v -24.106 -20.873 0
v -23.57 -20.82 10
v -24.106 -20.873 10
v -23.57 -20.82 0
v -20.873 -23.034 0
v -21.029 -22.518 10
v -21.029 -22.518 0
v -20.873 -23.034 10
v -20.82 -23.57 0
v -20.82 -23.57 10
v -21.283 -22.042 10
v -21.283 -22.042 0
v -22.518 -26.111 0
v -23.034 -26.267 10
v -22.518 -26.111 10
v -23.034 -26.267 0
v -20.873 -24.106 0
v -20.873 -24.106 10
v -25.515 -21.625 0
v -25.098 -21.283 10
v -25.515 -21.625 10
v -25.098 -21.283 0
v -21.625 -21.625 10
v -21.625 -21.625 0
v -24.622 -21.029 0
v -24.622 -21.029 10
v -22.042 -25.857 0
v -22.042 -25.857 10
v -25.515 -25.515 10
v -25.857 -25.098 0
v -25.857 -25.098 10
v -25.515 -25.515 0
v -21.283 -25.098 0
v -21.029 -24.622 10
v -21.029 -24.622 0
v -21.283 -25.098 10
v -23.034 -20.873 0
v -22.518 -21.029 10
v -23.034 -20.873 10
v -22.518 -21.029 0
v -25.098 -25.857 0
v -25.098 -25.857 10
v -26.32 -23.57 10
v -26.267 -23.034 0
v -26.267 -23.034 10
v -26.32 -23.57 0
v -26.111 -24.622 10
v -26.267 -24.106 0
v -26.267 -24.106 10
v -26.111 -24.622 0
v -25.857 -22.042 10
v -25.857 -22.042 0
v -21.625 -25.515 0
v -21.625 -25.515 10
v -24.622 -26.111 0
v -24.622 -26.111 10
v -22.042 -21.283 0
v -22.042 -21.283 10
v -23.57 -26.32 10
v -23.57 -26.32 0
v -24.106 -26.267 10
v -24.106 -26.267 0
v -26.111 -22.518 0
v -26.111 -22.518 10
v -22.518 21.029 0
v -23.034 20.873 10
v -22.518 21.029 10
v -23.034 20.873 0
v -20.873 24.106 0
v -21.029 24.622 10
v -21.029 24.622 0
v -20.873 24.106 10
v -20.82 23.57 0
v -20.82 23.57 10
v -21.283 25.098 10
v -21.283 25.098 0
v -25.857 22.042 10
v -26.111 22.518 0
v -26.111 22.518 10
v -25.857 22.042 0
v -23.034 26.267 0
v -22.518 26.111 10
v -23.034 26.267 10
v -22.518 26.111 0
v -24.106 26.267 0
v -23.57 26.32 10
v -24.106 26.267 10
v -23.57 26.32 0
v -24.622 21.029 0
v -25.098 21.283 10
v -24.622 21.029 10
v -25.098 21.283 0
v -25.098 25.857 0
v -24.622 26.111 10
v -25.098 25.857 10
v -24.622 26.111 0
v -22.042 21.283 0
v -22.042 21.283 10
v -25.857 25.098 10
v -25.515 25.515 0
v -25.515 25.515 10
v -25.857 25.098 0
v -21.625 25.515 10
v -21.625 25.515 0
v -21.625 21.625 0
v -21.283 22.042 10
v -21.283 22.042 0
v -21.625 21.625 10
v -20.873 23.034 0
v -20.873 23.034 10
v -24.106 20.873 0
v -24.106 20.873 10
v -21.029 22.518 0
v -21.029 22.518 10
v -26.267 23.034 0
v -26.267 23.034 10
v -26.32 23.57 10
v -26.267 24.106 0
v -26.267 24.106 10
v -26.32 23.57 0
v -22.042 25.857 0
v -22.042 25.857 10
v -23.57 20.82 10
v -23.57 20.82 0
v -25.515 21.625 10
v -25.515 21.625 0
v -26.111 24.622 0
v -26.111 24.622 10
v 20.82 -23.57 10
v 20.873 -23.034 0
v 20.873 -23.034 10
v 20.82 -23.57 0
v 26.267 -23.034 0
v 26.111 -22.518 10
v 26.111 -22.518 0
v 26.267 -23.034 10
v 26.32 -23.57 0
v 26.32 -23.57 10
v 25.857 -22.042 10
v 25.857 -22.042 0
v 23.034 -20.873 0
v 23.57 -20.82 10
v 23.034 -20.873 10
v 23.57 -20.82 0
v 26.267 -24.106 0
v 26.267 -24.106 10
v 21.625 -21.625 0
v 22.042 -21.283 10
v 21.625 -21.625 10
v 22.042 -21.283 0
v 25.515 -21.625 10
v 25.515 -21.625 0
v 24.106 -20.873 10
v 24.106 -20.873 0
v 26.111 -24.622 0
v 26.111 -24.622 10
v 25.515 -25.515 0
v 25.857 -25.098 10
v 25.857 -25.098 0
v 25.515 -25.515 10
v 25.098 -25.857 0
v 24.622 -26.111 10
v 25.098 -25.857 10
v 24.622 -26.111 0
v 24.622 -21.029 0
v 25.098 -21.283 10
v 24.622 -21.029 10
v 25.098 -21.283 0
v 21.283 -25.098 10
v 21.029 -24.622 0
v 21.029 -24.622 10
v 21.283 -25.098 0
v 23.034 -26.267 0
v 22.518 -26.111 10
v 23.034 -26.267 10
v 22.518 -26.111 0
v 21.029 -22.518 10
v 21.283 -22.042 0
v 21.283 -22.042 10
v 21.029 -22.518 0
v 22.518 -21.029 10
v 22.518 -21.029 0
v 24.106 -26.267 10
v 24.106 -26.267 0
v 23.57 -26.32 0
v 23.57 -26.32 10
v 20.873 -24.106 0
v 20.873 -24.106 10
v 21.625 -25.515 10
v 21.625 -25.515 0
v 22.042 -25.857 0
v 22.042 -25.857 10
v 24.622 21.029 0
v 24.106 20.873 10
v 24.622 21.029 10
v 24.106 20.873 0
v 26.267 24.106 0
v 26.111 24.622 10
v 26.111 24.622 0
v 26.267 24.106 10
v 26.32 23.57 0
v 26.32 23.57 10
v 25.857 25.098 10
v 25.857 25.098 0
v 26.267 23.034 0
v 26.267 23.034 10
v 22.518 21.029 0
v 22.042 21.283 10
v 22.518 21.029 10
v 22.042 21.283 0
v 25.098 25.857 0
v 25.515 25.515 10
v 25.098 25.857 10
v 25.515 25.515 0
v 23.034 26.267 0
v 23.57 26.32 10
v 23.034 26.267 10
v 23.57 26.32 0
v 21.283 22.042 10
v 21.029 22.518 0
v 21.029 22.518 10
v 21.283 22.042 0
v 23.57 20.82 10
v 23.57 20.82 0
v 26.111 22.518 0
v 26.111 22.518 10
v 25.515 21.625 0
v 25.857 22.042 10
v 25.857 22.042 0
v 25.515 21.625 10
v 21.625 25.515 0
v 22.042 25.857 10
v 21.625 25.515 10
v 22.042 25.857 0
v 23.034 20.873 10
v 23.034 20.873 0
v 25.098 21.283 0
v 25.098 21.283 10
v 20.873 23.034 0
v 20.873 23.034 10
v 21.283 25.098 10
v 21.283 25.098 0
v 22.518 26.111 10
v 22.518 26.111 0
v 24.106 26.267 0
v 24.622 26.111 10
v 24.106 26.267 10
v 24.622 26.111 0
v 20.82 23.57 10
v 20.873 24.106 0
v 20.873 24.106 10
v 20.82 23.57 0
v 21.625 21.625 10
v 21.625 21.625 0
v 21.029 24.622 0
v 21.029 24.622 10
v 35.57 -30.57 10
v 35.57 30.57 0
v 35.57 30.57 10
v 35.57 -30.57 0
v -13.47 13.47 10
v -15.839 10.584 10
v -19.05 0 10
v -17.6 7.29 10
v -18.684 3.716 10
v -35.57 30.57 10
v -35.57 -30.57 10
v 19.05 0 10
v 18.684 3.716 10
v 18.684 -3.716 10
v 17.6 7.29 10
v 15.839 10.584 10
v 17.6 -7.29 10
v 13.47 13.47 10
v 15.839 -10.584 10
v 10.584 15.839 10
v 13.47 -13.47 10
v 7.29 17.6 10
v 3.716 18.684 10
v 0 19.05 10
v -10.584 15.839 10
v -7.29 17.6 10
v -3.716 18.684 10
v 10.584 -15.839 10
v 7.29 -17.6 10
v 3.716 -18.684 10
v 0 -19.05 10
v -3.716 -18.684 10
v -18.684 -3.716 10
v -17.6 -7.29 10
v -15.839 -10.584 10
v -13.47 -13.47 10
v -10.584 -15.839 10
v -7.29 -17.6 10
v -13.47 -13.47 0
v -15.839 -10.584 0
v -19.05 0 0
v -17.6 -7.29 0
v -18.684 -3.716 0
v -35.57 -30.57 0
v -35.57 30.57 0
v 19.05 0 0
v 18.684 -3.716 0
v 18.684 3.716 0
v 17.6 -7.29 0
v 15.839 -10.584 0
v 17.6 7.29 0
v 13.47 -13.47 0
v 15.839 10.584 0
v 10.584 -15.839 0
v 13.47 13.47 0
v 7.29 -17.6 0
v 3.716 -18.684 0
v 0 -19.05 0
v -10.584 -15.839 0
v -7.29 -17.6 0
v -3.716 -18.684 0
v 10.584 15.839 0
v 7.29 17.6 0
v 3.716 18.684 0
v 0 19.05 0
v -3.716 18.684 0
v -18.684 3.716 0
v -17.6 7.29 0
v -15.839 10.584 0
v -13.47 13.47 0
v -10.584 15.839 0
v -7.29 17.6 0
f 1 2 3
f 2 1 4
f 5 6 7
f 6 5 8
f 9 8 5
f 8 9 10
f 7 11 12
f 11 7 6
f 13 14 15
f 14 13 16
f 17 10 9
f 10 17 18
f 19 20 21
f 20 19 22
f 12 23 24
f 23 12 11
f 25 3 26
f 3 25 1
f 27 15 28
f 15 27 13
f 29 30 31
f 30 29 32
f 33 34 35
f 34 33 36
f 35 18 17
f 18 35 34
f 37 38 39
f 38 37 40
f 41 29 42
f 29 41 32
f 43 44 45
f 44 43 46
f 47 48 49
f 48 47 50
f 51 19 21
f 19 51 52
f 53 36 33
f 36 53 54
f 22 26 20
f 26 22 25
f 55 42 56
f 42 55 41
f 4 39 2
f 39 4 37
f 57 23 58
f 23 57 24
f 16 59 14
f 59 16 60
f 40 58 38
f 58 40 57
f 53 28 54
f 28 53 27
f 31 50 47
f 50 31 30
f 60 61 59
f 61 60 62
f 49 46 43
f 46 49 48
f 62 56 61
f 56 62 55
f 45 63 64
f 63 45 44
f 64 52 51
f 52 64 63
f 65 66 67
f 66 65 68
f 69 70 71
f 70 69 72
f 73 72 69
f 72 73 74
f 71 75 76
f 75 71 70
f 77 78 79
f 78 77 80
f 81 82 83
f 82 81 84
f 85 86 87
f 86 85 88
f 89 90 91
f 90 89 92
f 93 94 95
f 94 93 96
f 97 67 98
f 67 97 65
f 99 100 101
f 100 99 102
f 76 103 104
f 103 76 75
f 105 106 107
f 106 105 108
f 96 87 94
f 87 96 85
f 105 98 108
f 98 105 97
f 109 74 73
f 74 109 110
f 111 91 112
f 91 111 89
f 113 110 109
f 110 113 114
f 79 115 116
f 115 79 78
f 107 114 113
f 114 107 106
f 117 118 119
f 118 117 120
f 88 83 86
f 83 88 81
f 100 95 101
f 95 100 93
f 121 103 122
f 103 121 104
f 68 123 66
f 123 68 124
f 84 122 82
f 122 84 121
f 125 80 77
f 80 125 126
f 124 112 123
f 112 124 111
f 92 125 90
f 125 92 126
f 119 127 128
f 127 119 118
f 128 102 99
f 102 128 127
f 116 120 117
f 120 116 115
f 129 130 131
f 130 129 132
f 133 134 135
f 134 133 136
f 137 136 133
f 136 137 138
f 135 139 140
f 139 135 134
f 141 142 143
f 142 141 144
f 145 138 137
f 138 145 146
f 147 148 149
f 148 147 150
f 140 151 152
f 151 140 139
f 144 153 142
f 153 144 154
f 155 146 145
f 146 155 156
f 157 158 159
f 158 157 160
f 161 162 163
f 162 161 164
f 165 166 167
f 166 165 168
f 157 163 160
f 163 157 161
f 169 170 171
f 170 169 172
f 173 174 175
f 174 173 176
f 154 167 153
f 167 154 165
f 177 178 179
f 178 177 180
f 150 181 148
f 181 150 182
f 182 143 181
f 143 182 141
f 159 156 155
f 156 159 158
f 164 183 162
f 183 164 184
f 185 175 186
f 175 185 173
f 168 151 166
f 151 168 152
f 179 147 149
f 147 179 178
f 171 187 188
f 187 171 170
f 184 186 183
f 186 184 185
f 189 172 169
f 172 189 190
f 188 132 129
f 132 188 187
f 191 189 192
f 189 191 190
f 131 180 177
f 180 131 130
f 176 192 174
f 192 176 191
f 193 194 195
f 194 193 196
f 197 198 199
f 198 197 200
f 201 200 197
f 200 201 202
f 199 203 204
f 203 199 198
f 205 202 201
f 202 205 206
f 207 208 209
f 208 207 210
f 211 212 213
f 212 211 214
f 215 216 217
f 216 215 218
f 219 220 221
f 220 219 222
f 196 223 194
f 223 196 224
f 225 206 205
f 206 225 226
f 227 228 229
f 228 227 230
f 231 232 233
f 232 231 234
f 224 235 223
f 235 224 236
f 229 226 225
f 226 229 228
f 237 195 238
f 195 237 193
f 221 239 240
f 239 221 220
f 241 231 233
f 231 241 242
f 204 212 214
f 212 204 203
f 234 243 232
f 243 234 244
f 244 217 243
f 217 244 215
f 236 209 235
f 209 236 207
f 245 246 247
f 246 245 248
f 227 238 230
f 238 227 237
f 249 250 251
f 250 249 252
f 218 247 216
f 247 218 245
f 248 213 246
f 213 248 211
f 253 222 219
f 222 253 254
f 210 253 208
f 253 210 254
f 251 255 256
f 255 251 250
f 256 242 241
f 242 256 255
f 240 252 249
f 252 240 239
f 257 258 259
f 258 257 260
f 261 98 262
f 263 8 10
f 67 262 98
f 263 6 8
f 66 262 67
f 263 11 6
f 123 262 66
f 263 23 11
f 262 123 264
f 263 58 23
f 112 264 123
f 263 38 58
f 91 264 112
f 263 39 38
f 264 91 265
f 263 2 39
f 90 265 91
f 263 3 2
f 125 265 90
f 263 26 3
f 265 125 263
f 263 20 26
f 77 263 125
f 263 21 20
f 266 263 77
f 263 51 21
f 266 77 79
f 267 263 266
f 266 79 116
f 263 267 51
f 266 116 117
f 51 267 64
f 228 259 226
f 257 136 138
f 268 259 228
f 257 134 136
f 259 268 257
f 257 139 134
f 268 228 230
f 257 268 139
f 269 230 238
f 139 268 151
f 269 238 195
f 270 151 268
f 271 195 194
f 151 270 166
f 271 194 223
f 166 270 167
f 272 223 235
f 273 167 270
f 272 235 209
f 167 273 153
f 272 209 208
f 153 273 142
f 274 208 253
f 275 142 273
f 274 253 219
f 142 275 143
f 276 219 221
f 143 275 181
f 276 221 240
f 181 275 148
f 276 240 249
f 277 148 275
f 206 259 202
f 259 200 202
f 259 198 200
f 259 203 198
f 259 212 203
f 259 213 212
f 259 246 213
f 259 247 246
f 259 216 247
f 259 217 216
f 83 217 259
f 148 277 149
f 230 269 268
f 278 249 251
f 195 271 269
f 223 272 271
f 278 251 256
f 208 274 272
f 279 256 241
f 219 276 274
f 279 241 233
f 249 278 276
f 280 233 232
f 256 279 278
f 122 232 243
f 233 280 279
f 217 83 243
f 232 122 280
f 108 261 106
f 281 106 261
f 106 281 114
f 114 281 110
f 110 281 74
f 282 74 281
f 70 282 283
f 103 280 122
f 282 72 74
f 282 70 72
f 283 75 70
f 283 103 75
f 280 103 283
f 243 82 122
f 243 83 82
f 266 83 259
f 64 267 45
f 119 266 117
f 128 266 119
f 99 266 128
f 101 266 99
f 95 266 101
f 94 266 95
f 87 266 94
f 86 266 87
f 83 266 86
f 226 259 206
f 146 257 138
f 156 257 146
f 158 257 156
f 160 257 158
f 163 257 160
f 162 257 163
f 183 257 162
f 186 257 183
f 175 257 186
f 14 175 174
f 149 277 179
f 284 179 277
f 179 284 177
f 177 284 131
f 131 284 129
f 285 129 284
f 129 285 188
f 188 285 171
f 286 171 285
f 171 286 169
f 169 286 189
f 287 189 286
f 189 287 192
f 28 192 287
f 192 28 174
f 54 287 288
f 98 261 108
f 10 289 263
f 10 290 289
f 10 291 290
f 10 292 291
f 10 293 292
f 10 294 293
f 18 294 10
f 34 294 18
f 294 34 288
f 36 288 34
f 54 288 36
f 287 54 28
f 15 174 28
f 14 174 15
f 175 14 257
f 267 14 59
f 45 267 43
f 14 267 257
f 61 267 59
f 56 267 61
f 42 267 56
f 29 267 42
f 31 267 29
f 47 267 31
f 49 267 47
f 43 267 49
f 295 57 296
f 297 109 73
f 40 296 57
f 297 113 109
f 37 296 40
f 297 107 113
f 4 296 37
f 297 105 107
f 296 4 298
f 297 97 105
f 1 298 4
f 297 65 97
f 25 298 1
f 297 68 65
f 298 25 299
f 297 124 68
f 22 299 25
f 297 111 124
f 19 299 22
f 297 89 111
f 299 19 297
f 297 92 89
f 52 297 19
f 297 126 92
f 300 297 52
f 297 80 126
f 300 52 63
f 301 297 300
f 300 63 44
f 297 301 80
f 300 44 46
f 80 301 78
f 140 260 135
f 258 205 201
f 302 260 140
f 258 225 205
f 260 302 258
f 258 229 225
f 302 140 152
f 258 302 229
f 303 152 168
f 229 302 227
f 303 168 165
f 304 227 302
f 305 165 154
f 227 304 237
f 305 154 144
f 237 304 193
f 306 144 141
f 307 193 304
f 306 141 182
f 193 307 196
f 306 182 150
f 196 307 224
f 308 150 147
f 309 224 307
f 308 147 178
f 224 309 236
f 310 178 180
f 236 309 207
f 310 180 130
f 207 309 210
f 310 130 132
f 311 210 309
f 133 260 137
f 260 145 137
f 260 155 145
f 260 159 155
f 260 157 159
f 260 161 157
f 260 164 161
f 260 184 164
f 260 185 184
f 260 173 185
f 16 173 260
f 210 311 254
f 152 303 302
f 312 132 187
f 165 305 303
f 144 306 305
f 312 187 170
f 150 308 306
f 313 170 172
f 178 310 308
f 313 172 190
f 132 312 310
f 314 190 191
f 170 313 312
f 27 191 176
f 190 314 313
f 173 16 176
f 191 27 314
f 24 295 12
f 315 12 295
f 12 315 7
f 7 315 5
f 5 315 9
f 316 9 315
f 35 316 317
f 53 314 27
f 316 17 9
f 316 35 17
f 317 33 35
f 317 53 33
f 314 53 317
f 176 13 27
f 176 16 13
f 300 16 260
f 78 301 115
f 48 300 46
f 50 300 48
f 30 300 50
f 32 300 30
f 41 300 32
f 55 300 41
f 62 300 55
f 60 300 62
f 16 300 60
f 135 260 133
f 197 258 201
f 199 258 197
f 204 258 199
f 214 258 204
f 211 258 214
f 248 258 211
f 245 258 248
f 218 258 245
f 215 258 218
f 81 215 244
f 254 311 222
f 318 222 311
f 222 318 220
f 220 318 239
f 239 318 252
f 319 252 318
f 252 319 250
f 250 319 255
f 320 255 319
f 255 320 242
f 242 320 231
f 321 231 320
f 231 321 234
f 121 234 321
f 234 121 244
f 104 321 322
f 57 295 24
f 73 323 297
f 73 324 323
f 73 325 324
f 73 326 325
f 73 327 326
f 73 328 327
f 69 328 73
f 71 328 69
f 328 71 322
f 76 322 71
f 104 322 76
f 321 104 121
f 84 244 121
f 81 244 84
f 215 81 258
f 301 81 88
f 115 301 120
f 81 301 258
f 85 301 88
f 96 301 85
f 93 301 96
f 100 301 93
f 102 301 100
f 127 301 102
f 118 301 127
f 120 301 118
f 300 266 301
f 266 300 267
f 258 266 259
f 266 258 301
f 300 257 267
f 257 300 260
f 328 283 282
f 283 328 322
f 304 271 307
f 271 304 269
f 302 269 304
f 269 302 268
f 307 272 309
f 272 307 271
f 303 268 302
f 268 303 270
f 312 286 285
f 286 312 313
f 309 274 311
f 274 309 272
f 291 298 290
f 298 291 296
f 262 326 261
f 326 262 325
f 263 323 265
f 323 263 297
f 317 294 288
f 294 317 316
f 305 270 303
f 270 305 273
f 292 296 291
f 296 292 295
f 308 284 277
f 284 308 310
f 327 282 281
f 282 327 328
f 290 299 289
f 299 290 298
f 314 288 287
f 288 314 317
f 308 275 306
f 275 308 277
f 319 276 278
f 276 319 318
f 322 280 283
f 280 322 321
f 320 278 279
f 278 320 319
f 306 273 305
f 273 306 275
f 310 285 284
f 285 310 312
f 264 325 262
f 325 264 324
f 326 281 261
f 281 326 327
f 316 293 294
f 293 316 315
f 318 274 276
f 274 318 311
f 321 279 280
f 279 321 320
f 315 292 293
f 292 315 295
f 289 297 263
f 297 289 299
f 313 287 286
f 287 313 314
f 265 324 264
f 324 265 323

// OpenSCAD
$fn = 32;

// ----------------------------------------------------------------------
// Motor mount plate: NEMA23, 71.14 x 61.14 x 10 mm
// ----------------------------------------------------------------------

// --- parameters (mm) ---
mount_w = 71.14;          // plate length, X
mount_d = 61.14;          // plate width, Y
mat_t = 10;               // plate thickness
motor_pitch = 47.14;      // NEMA23 bolt spacing
motor_d = 5.5;            // NEMA23 screw clearance
center_bore = 38.1;       // pilot boss bore

module plate() {
  translate([-mount_w / 2, -mount_d / 2, 0]) cube([mount_w, mount_d, mat_t]);
}

module motor_holes() {
  for (sx = [-1, 1]) for (sy = [-1, 1])
    translate([sx * motor_pitch / 2, sy * motor_pitch / 2, -1])
      cylinder(h = mat_t + 2, d = motor_d);
}

difference() {
  union() {
    plate();
  }
  motor_holes();
  translate([0, 0, -1]) cylinder(h = mat_t + 2, d = center_bore);
}
